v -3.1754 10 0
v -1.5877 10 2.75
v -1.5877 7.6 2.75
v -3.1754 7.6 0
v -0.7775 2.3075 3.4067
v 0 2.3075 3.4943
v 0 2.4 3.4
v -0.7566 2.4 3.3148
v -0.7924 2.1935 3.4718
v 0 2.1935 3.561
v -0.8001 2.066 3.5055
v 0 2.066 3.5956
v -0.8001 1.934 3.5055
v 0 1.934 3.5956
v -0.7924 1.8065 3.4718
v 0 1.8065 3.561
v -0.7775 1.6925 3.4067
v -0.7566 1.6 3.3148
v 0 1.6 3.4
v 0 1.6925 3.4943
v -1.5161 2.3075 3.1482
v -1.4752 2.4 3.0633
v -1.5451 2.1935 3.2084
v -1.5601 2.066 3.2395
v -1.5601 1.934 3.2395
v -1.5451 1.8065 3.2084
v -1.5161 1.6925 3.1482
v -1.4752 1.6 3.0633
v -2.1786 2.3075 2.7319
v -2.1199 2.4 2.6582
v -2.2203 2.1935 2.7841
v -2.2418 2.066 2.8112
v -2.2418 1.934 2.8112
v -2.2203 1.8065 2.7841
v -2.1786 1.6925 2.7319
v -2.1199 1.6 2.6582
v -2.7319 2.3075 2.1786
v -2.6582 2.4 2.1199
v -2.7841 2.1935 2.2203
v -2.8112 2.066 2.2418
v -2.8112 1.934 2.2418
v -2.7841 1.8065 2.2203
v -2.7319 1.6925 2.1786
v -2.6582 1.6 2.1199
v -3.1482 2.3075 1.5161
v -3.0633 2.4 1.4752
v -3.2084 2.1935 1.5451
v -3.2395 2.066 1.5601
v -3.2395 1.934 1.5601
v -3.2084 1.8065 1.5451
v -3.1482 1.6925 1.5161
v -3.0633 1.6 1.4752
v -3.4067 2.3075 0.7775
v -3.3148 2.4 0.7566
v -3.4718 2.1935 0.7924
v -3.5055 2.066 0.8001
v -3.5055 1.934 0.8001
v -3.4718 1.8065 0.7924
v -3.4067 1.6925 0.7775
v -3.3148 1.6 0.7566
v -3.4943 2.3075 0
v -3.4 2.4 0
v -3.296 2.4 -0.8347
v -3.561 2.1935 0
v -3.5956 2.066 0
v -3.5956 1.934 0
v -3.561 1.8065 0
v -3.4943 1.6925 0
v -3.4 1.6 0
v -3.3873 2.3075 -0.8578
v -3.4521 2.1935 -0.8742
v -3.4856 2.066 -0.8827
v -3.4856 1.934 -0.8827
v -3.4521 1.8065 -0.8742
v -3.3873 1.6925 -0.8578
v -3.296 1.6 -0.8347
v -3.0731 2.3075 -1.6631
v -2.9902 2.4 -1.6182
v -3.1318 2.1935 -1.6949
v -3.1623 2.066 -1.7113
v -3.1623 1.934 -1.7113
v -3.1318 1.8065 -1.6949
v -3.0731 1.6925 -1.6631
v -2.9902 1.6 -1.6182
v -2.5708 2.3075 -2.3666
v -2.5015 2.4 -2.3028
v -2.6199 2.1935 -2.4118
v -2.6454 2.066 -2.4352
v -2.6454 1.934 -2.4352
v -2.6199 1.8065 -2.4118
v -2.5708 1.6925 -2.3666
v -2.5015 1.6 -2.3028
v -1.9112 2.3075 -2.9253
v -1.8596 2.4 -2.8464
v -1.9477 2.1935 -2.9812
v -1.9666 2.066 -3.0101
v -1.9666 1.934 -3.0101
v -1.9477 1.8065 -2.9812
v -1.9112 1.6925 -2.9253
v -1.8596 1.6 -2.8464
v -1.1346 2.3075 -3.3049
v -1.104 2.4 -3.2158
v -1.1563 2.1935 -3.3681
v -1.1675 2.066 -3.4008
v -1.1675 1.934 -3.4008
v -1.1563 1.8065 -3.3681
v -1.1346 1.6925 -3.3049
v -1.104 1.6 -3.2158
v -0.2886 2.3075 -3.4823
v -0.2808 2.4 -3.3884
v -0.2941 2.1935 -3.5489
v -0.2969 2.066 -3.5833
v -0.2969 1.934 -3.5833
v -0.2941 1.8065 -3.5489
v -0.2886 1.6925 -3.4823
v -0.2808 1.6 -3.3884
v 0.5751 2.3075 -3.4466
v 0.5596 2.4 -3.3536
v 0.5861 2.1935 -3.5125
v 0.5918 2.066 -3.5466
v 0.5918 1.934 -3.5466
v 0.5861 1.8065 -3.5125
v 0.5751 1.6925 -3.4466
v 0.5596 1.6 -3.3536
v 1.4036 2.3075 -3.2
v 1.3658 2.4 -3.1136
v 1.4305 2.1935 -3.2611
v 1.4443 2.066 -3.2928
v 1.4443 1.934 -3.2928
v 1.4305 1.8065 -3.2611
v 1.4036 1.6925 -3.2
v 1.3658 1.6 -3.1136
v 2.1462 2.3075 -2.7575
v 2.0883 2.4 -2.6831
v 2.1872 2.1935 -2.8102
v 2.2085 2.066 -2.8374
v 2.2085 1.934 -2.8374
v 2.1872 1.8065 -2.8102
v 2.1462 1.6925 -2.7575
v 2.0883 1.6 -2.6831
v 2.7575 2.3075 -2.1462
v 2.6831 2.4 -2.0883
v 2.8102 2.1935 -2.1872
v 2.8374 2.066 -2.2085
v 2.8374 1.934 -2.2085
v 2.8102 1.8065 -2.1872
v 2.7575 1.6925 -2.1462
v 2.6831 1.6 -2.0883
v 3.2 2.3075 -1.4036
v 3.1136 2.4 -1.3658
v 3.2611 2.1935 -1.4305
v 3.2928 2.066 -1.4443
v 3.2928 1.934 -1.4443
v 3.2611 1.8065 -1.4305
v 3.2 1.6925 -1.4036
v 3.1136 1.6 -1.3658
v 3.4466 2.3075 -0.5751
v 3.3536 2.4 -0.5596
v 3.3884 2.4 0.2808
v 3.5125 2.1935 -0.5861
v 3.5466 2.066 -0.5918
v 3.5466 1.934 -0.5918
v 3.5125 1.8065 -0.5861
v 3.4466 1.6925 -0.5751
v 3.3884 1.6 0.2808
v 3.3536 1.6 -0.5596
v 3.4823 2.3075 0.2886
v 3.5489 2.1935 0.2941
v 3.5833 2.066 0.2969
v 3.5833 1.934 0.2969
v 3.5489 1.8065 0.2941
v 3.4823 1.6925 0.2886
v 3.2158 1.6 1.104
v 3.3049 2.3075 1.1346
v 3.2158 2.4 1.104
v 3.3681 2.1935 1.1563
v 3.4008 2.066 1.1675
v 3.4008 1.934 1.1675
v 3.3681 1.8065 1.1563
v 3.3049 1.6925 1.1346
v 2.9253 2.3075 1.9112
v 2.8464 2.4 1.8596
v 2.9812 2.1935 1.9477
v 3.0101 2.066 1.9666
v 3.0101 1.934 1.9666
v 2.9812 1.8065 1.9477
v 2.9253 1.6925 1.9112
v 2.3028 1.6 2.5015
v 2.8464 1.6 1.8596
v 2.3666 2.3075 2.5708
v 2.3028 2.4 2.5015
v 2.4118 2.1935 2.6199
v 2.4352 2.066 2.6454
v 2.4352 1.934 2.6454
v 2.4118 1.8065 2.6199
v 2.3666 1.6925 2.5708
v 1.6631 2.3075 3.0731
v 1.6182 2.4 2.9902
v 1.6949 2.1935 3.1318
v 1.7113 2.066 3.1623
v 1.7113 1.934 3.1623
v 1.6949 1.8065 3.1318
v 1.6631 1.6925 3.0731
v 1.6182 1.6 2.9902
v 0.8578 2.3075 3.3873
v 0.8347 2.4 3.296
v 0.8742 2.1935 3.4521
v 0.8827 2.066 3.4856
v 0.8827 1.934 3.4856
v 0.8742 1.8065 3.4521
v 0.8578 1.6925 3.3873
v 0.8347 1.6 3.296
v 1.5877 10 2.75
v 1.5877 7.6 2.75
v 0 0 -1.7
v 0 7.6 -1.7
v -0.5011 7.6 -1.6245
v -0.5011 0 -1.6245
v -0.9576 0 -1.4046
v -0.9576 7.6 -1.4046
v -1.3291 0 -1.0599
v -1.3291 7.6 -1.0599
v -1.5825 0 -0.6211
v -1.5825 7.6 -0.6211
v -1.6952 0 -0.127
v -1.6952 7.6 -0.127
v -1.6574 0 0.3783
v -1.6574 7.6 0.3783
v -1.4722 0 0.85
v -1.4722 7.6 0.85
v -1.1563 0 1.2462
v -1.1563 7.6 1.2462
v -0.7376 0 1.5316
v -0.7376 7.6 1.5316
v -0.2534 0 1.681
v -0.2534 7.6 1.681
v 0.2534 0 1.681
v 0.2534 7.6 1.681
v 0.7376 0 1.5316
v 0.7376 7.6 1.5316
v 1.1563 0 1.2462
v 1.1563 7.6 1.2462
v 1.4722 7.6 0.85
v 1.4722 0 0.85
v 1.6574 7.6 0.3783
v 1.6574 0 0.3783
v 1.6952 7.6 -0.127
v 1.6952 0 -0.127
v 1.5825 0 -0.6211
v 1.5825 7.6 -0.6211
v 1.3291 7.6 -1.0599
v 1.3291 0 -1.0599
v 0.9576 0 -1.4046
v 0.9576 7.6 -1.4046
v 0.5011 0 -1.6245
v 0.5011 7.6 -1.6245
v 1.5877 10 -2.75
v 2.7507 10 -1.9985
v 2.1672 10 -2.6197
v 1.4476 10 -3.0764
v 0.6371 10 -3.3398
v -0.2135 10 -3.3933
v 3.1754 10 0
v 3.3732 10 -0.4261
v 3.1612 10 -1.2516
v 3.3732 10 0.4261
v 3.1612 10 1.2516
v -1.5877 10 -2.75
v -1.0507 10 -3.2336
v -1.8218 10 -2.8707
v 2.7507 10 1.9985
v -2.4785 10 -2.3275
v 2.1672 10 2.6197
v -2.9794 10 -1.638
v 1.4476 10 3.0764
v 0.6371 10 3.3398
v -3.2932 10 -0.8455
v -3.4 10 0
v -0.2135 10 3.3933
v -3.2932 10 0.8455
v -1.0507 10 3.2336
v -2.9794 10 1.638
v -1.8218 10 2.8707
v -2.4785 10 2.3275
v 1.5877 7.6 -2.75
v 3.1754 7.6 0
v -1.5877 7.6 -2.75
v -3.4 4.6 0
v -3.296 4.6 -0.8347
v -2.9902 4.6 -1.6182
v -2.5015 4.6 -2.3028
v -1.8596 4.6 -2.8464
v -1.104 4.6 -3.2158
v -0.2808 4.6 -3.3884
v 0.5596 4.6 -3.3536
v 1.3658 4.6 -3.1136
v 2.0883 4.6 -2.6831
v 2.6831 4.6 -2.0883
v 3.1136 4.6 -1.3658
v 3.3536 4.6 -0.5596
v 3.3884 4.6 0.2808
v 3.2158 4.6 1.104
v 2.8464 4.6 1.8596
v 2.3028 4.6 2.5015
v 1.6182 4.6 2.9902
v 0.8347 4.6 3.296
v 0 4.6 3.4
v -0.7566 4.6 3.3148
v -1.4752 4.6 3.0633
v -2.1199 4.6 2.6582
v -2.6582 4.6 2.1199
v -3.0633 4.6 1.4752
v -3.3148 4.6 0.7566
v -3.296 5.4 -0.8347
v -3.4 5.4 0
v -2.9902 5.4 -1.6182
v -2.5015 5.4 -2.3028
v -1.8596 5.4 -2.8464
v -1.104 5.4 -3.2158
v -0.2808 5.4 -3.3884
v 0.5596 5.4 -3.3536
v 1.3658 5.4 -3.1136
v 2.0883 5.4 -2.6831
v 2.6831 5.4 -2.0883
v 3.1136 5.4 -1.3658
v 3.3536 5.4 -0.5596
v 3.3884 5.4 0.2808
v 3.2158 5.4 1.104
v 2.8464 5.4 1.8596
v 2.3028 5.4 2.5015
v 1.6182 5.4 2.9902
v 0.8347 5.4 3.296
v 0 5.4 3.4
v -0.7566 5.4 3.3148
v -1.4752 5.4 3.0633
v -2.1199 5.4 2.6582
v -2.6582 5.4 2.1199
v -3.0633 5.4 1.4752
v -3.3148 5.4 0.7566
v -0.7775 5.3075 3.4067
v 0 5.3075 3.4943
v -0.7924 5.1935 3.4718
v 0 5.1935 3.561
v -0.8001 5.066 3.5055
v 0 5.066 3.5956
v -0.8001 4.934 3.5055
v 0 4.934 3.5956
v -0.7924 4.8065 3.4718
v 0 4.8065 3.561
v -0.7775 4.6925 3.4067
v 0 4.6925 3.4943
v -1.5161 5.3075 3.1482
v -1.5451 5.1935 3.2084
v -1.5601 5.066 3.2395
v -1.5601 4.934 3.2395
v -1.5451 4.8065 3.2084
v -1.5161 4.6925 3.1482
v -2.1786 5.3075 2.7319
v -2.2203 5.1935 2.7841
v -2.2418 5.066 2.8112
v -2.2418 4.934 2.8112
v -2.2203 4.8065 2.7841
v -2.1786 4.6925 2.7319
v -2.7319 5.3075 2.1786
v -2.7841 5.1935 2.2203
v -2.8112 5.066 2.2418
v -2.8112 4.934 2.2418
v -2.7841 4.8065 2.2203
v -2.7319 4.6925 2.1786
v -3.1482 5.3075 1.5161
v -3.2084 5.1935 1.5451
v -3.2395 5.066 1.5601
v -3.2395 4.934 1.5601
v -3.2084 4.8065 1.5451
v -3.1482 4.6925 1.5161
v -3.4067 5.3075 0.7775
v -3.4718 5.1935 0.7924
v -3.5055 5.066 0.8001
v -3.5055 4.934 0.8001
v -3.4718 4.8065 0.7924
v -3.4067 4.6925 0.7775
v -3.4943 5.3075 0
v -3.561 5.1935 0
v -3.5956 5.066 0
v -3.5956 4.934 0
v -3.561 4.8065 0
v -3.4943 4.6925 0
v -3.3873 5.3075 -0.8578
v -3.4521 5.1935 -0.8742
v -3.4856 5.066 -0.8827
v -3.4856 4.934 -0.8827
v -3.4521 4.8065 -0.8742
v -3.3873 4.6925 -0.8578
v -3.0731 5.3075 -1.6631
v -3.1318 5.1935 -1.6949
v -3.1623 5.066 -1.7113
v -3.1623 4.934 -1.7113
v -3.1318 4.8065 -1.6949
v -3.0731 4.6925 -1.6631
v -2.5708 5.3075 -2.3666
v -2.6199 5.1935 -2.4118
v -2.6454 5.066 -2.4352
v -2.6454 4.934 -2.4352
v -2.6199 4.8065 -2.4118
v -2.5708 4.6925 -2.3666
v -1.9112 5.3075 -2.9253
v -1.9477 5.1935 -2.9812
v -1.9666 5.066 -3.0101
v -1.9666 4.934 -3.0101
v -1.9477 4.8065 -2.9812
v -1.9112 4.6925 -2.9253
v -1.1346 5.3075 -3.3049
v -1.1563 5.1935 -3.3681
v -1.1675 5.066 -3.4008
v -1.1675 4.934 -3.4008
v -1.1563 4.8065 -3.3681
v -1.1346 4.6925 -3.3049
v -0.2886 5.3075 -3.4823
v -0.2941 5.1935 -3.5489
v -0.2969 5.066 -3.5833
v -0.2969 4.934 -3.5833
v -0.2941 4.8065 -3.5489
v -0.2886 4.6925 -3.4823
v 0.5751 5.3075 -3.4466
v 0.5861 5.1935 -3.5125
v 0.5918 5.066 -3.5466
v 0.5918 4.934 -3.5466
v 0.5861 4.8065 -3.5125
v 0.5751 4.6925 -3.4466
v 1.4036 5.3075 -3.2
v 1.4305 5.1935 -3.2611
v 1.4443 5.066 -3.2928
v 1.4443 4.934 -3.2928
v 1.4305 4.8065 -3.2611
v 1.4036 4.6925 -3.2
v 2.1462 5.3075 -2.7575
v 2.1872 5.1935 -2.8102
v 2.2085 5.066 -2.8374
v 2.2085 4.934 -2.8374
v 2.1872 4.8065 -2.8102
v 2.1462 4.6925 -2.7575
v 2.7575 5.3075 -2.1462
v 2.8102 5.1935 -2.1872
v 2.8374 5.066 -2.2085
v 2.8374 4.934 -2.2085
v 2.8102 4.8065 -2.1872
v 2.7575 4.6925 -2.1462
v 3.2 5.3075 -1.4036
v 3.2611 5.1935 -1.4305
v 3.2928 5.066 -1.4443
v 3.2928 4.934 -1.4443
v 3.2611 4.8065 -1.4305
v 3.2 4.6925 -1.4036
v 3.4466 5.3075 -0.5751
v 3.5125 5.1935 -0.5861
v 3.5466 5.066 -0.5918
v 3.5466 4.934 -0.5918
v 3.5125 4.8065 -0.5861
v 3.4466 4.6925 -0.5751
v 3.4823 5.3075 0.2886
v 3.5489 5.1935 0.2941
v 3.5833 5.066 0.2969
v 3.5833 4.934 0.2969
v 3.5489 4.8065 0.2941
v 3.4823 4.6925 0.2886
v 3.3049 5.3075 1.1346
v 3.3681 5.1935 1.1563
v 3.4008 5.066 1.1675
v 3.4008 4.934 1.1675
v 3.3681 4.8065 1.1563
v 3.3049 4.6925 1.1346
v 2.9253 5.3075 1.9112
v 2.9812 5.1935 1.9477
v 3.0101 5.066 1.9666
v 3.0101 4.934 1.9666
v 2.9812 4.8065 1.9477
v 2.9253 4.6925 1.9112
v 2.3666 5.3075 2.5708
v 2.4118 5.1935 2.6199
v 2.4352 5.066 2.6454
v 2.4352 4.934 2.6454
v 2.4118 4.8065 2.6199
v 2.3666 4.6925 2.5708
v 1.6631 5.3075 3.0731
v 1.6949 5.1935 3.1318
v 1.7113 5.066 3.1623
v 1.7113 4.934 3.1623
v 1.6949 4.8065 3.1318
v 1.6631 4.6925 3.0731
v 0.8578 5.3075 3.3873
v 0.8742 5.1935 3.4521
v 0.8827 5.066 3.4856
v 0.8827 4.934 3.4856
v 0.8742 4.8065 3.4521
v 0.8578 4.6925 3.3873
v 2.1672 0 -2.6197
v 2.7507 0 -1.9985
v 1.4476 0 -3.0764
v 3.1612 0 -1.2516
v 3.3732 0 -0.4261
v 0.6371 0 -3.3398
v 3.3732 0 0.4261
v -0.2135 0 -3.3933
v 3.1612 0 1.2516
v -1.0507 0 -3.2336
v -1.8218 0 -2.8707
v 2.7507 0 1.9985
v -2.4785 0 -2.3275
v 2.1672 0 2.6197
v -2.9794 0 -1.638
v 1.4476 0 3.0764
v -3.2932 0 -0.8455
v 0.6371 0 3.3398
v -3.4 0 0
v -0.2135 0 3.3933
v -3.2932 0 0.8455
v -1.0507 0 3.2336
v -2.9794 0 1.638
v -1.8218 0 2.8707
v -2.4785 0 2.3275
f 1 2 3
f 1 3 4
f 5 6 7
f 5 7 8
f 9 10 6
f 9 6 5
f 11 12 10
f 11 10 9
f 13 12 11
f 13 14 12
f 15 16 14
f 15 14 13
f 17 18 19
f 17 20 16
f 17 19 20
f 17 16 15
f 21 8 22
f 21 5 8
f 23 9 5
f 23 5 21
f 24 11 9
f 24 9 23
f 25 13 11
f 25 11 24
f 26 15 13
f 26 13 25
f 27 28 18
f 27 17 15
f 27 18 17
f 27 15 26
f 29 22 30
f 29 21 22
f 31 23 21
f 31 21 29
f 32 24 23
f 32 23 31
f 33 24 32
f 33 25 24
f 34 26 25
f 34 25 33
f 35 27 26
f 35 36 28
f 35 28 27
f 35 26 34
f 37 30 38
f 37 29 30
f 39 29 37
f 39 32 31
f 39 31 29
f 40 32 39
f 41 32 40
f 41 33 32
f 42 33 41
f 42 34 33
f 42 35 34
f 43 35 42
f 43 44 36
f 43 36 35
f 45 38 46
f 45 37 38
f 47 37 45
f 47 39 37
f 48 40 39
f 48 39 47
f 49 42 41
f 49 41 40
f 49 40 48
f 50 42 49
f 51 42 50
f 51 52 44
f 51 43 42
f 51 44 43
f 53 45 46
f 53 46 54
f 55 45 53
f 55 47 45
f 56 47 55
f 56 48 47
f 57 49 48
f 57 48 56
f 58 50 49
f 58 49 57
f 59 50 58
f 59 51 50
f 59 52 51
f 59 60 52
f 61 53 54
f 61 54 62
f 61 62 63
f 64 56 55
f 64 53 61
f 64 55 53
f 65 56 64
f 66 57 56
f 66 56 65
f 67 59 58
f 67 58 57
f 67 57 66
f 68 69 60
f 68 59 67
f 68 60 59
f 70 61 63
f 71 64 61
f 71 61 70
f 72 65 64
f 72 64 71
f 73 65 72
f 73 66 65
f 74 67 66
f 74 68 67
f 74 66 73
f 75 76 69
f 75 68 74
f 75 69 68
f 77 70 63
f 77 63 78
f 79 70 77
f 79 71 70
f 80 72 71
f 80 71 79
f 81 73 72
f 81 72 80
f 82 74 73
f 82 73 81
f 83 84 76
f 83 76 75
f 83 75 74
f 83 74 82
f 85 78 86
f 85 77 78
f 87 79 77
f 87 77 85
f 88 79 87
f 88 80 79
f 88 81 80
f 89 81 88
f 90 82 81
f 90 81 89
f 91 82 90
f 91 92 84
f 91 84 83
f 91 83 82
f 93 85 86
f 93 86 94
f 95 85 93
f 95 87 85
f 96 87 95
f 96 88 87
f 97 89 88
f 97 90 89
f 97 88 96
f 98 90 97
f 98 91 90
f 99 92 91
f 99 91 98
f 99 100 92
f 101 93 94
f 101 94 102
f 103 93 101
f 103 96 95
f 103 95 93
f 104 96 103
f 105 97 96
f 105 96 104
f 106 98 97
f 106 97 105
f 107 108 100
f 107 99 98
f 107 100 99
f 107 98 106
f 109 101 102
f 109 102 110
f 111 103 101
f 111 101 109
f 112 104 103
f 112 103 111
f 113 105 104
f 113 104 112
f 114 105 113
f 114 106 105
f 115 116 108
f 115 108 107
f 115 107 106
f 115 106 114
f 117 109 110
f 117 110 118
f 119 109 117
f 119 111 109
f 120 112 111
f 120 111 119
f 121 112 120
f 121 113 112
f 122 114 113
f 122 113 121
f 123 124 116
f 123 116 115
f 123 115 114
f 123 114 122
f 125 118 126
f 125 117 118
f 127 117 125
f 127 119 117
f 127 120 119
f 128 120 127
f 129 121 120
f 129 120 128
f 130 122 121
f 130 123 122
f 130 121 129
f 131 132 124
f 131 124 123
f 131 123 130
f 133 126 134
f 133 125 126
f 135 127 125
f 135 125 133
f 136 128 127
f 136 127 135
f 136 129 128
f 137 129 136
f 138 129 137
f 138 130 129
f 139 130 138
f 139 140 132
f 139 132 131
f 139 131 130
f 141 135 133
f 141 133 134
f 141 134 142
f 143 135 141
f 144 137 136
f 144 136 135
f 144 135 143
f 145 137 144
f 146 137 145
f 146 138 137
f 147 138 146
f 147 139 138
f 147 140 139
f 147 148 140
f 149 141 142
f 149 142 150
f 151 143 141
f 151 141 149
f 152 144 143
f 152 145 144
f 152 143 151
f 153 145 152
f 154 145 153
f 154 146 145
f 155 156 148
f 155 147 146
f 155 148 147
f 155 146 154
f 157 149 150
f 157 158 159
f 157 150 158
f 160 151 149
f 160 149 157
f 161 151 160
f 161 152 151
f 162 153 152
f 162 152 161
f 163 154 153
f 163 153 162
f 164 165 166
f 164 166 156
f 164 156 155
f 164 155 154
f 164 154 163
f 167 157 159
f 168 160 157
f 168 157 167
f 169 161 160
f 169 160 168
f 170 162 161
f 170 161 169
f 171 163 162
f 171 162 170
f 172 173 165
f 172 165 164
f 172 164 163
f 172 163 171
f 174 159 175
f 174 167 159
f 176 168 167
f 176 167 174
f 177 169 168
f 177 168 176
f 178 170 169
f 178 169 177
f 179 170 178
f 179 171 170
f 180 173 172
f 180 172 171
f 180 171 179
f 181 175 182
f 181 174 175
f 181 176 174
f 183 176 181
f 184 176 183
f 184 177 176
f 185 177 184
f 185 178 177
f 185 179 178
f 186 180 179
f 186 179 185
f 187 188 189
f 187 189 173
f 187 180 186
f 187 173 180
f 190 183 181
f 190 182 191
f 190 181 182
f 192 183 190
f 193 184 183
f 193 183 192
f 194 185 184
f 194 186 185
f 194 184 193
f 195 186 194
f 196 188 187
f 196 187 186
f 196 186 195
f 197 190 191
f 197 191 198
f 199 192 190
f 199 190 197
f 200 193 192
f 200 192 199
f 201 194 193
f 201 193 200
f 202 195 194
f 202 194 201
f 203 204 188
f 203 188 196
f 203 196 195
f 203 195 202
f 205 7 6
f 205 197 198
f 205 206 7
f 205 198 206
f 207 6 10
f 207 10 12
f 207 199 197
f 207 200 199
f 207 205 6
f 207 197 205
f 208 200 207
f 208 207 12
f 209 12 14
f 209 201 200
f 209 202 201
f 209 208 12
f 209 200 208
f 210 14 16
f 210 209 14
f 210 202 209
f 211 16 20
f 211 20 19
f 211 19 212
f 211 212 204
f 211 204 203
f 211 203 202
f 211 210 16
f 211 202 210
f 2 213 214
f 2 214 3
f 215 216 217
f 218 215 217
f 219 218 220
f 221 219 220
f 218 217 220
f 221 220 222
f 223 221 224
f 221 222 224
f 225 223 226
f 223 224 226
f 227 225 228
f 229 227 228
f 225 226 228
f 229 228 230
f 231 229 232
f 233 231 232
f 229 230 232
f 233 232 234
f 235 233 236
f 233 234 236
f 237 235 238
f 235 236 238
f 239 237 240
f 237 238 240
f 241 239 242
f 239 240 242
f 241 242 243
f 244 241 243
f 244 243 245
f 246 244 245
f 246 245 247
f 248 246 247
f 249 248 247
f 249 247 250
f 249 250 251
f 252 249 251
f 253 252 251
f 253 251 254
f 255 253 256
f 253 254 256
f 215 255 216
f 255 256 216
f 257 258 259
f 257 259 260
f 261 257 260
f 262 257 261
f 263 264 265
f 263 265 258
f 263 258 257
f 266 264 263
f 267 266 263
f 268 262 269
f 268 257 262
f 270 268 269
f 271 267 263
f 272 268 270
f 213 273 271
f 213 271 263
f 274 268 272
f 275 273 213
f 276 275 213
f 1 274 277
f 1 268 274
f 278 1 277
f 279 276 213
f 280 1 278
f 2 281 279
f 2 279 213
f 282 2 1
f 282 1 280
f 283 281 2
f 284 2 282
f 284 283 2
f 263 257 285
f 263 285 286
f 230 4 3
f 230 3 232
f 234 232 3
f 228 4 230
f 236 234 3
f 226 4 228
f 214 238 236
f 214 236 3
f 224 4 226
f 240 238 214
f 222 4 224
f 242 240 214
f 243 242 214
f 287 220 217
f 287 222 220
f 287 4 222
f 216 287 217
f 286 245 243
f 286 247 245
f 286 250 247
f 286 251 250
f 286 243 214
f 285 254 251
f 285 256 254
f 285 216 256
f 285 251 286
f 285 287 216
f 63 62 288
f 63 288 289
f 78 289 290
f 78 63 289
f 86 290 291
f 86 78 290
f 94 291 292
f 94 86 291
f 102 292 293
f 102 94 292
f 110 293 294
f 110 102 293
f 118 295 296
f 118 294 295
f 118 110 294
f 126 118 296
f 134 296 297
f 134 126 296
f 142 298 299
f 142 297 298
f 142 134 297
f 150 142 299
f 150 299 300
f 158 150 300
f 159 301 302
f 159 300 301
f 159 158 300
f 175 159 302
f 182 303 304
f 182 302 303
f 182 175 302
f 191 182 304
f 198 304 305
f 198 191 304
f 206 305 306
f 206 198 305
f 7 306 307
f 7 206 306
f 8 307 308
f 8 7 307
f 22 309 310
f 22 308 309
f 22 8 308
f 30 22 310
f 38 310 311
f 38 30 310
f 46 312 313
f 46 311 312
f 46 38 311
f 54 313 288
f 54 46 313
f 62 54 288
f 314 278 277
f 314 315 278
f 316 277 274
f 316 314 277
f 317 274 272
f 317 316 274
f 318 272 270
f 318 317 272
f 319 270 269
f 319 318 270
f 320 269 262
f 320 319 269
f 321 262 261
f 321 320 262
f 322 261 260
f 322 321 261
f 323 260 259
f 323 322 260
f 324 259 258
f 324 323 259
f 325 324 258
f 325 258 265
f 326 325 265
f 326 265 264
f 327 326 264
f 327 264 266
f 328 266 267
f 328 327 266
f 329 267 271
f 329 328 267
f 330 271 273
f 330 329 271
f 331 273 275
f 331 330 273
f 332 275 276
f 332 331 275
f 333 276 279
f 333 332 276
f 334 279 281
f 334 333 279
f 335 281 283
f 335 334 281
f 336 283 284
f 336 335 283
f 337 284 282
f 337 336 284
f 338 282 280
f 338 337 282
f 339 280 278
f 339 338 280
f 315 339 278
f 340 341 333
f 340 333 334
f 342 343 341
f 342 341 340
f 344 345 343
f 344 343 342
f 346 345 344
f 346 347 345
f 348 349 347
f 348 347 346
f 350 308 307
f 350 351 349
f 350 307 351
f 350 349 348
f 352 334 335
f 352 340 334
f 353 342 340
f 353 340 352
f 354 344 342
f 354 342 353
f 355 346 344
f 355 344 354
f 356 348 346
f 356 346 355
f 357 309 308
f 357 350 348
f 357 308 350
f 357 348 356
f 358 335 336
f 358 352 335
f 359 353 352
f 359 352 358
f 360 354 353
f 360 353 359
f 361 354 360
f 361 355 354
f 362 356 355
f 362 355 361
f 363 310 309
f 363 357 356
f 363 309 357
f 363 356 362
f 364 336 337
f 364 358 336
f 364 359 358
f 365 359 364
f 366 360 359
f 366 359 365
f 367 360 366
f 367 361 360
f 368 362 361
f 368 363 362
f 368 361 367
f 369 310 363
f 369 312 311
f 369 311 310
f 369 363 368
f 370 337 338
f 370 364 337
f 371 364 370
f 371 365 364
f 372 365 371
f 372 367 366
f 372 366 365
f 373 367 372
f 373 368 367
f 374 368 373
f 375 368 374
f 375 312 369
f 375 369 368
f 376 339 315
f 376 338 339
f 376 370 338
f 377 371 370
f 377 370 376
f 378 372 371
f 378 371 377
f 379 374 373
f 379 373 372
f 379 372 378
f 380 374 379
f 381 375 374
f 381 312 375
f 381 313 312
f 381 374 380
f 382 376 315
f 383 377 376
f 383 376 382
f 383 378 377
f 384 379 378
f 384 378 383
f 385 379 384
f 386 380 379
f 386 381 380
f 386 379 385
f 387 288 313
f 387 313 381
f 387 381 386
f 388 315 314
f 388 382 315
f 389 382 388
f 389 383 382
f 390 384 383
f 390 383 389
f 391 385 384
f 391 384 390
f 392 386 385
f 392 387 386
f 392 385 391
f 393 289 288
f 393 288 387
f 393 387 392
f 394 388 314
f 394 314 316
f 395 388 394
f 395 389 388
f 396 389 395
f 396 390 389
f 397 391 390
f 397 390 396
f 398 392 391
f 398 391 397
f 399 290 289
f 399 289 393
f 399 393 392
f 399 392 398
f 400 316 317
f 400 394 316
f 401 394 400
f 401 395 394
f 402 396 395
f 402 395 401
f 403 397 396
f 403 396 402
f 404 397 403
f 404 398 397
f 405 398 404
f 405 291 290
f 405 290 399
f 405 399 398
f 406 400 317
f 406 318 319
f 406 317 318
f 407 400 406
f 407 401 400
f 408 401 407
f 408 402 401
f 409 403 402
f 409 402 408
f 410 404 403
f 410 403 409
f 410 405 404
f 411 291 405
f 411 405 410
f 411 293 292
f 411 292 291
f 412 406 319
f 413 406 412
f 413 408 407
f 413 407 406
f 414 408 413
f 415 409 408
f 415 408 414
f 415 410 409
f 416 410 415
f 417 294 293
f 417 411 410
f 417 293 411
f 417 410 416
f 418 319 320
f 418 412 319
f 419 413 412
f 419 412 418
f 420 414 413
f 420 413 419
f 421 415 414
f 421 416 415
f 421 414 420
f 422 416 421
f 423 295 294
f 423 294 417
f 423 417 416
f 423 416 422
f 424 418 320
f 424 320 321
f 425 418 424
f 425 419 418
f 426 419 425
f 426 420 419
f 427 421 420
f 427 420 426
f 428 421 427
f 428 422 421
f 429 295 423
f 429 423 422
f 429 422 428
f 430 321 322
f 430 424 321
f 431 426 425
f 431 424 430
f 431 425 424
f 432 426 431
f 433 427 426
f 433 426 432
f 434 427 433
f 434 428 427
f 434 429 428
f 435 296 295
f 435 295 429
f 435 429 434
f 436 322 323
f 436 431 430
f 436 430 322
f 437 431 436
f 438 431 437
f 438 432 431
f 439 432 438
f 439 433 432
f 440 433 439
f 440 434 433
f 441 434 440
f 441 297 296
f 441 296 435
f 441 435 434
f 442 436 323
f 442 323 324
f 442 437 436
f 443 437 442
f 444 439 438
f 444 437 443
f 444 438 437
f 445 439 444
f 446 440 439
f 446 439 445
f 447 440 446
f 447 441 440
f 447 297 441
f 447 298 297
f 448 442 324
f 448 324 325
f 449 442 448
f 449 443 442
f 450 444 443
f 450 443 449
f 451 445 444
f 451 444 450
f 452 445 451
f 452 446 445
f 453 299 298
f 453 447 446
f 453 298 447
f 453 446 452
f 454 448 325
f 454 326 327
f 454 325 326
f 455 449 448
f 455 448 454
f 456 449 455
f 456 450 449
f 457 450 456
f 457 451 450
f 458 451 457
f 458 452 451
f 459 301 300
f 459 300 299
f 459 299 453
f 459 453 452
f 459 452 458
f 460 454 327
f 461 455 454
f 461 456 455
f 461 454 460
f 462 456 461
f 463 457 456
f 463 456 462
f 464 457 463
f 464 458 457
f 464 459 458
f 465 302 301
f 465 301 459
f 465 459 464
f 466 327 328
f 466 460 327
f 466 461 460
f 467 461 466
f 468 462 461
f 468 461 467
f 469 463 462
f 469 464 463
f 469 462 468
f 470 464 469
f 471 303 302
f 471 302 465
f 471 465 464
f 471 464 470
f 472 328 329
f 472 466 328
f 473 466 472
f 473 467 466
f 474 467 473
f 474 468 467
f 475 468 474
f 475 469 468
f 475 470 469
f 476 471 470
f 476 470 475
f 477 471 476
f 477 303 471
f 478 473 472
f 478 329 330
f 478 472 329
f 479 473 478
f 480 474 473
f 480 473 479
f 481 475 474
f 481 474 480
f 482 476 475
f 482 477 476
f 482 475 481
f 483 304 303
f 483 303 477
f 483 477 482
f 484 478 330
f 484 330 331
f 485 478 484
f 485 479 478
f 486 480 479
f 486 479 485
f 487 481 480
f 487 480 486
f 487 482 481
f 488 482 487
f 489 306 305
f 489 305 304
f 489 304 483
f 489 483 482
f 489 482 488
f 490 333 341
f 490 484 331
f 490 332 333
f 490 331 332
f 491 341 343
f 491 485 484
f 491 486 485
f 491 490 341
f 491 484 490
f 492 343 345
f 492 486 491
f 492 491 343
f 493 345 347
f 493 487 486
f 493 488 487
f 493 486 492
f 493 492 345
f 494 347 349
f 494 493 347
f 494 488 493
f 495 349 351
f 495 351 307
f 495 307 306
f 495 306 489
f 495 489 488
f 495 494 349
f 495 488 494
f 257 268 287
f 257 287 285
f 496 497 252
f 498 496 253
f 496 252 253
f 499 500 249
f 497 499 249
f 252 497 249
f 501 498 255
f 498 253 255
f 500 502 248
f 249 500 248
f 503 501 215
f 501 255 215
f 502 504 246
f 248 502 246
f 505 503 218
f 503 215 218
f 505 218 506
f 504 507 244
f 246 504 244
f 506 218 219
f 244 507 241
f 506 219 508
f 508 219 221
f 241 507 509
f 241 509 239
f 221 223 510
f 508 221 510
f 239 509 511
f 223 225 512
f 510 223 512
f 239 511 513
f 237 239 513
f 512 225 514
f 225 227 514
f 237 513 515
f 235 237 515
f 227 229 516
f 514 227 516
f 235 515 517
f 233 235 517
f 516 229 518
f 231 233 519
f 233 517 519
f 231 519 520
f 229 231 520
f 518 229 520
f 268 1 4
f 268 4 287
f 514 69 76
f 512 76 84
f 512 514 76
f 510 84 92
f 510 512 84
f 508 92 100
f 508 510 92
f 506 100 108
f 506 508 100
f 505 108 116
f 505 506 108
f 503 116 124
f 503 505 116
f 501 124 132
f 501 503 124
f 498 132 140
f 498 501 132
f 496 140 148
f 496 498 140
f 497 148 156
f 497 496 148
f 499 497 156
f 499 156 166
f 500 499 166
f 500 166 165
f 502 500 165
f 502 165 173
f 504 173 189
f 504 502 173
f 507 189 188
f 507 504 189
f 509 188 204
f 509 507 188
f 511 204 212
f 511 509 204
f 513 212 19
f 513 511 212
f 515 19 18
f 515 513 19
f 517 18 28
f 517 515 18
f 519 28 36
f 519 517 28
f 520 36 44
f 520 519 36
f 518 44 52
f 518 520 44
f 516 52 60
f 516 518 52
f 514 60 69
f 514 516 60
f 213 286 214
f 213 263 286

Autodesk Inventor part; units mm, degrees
ref_plane "YZ Plane" through (0, 0, 0) normal (1, 0, 0) x (0, 1, 0)
ref_plane "XZ Plane" through (0, 0, 0) normal (0, 1, 0) x (-1, 0, 0)
ref_plane "XY Plane" through (0, 0, 0) normal (0, 0, 1) x (1, 0, 0)
sketch "Skizze1" plane through (0, 0, 0) normal (0, 1, 0) x (-1, 0, 0)
  circle A0 centre (0, 0) radius 3.4
  dimension "d0" = 6.8
extrude "Extrusion1" add sketch "Skizze1" along normal blind 10
sketch "Skizze2" plane through (0, 10, 0) normal (0, 1, 0) x (1, 0, 0)
  line L0 (-3.1754, 0) -> (-1.5877, 2.75)
  line L1 (-1.5877, 2.75) -> (1.5877, 2.75)
  line L2 (1.5877, 2.75) -> (3.1754, 0)
  line L3 (3.1754, 0) -> (1.5877, -2.75)
  line L4 (1.5877, -2.75) -> (-1.5877, -2.75)
  line L5 (-1.5877, -2.75) -> (-3.1754, 0)
  line L6 (3.1754, 0) -> (-3.1754, 0) construction
  line L7 (-4.76, 0) -> (4.76, 0) construction
  point P0 (0, 0)
  point P1 (0, 0)
  dimension "d10" = 5.5
extrude "Extrusion2" cut sketch "Skizze2" against normal blind 2.4
hole "Bohrung2" at (0, 0, 0) direction (0, 1, 0) diameter 3.4 end through all clearance for "Inbusschraube DIN EN ISO 4762" size "M3" standard "DIN"
sketch "Skizze3" plane through (0, 0, 0) normal (1, 0, 0) x (0, 1, 0)
  circle A0 centre (5, 3.1) radius 0.5
  line L0 (10, 2.75) -> (10, 0) projected
  line L1 (0, 0) -> (10, 0) construction
  circle A1 centre (2, 3.1) radius 0.5
  line L2 (2, 3.1) -> (5, 3.1) construction
  line L3 (0, 3.4) -> (10, 3.4) projected
  point P0 (1.6, 3.4)
  point P1 (2.4, 3.4)
  point P2 (4.6, 3.4)
  point P3 (5.4, 3.4)
  dimension "d21" = 3.1
  dimension "d22" = 5
  dimension "d23" = 3
  dimension "d24" = 1
revolve "Umdrehung1" add sketch "Skizze3" angle 360 about axis through (0, 0, 0) along (0, 1, 0) picked at (1.8932, 3.428) picked at (4.8932, 3.428) contours L3 A1 | L3 A0
properties part number "Tuebel"
